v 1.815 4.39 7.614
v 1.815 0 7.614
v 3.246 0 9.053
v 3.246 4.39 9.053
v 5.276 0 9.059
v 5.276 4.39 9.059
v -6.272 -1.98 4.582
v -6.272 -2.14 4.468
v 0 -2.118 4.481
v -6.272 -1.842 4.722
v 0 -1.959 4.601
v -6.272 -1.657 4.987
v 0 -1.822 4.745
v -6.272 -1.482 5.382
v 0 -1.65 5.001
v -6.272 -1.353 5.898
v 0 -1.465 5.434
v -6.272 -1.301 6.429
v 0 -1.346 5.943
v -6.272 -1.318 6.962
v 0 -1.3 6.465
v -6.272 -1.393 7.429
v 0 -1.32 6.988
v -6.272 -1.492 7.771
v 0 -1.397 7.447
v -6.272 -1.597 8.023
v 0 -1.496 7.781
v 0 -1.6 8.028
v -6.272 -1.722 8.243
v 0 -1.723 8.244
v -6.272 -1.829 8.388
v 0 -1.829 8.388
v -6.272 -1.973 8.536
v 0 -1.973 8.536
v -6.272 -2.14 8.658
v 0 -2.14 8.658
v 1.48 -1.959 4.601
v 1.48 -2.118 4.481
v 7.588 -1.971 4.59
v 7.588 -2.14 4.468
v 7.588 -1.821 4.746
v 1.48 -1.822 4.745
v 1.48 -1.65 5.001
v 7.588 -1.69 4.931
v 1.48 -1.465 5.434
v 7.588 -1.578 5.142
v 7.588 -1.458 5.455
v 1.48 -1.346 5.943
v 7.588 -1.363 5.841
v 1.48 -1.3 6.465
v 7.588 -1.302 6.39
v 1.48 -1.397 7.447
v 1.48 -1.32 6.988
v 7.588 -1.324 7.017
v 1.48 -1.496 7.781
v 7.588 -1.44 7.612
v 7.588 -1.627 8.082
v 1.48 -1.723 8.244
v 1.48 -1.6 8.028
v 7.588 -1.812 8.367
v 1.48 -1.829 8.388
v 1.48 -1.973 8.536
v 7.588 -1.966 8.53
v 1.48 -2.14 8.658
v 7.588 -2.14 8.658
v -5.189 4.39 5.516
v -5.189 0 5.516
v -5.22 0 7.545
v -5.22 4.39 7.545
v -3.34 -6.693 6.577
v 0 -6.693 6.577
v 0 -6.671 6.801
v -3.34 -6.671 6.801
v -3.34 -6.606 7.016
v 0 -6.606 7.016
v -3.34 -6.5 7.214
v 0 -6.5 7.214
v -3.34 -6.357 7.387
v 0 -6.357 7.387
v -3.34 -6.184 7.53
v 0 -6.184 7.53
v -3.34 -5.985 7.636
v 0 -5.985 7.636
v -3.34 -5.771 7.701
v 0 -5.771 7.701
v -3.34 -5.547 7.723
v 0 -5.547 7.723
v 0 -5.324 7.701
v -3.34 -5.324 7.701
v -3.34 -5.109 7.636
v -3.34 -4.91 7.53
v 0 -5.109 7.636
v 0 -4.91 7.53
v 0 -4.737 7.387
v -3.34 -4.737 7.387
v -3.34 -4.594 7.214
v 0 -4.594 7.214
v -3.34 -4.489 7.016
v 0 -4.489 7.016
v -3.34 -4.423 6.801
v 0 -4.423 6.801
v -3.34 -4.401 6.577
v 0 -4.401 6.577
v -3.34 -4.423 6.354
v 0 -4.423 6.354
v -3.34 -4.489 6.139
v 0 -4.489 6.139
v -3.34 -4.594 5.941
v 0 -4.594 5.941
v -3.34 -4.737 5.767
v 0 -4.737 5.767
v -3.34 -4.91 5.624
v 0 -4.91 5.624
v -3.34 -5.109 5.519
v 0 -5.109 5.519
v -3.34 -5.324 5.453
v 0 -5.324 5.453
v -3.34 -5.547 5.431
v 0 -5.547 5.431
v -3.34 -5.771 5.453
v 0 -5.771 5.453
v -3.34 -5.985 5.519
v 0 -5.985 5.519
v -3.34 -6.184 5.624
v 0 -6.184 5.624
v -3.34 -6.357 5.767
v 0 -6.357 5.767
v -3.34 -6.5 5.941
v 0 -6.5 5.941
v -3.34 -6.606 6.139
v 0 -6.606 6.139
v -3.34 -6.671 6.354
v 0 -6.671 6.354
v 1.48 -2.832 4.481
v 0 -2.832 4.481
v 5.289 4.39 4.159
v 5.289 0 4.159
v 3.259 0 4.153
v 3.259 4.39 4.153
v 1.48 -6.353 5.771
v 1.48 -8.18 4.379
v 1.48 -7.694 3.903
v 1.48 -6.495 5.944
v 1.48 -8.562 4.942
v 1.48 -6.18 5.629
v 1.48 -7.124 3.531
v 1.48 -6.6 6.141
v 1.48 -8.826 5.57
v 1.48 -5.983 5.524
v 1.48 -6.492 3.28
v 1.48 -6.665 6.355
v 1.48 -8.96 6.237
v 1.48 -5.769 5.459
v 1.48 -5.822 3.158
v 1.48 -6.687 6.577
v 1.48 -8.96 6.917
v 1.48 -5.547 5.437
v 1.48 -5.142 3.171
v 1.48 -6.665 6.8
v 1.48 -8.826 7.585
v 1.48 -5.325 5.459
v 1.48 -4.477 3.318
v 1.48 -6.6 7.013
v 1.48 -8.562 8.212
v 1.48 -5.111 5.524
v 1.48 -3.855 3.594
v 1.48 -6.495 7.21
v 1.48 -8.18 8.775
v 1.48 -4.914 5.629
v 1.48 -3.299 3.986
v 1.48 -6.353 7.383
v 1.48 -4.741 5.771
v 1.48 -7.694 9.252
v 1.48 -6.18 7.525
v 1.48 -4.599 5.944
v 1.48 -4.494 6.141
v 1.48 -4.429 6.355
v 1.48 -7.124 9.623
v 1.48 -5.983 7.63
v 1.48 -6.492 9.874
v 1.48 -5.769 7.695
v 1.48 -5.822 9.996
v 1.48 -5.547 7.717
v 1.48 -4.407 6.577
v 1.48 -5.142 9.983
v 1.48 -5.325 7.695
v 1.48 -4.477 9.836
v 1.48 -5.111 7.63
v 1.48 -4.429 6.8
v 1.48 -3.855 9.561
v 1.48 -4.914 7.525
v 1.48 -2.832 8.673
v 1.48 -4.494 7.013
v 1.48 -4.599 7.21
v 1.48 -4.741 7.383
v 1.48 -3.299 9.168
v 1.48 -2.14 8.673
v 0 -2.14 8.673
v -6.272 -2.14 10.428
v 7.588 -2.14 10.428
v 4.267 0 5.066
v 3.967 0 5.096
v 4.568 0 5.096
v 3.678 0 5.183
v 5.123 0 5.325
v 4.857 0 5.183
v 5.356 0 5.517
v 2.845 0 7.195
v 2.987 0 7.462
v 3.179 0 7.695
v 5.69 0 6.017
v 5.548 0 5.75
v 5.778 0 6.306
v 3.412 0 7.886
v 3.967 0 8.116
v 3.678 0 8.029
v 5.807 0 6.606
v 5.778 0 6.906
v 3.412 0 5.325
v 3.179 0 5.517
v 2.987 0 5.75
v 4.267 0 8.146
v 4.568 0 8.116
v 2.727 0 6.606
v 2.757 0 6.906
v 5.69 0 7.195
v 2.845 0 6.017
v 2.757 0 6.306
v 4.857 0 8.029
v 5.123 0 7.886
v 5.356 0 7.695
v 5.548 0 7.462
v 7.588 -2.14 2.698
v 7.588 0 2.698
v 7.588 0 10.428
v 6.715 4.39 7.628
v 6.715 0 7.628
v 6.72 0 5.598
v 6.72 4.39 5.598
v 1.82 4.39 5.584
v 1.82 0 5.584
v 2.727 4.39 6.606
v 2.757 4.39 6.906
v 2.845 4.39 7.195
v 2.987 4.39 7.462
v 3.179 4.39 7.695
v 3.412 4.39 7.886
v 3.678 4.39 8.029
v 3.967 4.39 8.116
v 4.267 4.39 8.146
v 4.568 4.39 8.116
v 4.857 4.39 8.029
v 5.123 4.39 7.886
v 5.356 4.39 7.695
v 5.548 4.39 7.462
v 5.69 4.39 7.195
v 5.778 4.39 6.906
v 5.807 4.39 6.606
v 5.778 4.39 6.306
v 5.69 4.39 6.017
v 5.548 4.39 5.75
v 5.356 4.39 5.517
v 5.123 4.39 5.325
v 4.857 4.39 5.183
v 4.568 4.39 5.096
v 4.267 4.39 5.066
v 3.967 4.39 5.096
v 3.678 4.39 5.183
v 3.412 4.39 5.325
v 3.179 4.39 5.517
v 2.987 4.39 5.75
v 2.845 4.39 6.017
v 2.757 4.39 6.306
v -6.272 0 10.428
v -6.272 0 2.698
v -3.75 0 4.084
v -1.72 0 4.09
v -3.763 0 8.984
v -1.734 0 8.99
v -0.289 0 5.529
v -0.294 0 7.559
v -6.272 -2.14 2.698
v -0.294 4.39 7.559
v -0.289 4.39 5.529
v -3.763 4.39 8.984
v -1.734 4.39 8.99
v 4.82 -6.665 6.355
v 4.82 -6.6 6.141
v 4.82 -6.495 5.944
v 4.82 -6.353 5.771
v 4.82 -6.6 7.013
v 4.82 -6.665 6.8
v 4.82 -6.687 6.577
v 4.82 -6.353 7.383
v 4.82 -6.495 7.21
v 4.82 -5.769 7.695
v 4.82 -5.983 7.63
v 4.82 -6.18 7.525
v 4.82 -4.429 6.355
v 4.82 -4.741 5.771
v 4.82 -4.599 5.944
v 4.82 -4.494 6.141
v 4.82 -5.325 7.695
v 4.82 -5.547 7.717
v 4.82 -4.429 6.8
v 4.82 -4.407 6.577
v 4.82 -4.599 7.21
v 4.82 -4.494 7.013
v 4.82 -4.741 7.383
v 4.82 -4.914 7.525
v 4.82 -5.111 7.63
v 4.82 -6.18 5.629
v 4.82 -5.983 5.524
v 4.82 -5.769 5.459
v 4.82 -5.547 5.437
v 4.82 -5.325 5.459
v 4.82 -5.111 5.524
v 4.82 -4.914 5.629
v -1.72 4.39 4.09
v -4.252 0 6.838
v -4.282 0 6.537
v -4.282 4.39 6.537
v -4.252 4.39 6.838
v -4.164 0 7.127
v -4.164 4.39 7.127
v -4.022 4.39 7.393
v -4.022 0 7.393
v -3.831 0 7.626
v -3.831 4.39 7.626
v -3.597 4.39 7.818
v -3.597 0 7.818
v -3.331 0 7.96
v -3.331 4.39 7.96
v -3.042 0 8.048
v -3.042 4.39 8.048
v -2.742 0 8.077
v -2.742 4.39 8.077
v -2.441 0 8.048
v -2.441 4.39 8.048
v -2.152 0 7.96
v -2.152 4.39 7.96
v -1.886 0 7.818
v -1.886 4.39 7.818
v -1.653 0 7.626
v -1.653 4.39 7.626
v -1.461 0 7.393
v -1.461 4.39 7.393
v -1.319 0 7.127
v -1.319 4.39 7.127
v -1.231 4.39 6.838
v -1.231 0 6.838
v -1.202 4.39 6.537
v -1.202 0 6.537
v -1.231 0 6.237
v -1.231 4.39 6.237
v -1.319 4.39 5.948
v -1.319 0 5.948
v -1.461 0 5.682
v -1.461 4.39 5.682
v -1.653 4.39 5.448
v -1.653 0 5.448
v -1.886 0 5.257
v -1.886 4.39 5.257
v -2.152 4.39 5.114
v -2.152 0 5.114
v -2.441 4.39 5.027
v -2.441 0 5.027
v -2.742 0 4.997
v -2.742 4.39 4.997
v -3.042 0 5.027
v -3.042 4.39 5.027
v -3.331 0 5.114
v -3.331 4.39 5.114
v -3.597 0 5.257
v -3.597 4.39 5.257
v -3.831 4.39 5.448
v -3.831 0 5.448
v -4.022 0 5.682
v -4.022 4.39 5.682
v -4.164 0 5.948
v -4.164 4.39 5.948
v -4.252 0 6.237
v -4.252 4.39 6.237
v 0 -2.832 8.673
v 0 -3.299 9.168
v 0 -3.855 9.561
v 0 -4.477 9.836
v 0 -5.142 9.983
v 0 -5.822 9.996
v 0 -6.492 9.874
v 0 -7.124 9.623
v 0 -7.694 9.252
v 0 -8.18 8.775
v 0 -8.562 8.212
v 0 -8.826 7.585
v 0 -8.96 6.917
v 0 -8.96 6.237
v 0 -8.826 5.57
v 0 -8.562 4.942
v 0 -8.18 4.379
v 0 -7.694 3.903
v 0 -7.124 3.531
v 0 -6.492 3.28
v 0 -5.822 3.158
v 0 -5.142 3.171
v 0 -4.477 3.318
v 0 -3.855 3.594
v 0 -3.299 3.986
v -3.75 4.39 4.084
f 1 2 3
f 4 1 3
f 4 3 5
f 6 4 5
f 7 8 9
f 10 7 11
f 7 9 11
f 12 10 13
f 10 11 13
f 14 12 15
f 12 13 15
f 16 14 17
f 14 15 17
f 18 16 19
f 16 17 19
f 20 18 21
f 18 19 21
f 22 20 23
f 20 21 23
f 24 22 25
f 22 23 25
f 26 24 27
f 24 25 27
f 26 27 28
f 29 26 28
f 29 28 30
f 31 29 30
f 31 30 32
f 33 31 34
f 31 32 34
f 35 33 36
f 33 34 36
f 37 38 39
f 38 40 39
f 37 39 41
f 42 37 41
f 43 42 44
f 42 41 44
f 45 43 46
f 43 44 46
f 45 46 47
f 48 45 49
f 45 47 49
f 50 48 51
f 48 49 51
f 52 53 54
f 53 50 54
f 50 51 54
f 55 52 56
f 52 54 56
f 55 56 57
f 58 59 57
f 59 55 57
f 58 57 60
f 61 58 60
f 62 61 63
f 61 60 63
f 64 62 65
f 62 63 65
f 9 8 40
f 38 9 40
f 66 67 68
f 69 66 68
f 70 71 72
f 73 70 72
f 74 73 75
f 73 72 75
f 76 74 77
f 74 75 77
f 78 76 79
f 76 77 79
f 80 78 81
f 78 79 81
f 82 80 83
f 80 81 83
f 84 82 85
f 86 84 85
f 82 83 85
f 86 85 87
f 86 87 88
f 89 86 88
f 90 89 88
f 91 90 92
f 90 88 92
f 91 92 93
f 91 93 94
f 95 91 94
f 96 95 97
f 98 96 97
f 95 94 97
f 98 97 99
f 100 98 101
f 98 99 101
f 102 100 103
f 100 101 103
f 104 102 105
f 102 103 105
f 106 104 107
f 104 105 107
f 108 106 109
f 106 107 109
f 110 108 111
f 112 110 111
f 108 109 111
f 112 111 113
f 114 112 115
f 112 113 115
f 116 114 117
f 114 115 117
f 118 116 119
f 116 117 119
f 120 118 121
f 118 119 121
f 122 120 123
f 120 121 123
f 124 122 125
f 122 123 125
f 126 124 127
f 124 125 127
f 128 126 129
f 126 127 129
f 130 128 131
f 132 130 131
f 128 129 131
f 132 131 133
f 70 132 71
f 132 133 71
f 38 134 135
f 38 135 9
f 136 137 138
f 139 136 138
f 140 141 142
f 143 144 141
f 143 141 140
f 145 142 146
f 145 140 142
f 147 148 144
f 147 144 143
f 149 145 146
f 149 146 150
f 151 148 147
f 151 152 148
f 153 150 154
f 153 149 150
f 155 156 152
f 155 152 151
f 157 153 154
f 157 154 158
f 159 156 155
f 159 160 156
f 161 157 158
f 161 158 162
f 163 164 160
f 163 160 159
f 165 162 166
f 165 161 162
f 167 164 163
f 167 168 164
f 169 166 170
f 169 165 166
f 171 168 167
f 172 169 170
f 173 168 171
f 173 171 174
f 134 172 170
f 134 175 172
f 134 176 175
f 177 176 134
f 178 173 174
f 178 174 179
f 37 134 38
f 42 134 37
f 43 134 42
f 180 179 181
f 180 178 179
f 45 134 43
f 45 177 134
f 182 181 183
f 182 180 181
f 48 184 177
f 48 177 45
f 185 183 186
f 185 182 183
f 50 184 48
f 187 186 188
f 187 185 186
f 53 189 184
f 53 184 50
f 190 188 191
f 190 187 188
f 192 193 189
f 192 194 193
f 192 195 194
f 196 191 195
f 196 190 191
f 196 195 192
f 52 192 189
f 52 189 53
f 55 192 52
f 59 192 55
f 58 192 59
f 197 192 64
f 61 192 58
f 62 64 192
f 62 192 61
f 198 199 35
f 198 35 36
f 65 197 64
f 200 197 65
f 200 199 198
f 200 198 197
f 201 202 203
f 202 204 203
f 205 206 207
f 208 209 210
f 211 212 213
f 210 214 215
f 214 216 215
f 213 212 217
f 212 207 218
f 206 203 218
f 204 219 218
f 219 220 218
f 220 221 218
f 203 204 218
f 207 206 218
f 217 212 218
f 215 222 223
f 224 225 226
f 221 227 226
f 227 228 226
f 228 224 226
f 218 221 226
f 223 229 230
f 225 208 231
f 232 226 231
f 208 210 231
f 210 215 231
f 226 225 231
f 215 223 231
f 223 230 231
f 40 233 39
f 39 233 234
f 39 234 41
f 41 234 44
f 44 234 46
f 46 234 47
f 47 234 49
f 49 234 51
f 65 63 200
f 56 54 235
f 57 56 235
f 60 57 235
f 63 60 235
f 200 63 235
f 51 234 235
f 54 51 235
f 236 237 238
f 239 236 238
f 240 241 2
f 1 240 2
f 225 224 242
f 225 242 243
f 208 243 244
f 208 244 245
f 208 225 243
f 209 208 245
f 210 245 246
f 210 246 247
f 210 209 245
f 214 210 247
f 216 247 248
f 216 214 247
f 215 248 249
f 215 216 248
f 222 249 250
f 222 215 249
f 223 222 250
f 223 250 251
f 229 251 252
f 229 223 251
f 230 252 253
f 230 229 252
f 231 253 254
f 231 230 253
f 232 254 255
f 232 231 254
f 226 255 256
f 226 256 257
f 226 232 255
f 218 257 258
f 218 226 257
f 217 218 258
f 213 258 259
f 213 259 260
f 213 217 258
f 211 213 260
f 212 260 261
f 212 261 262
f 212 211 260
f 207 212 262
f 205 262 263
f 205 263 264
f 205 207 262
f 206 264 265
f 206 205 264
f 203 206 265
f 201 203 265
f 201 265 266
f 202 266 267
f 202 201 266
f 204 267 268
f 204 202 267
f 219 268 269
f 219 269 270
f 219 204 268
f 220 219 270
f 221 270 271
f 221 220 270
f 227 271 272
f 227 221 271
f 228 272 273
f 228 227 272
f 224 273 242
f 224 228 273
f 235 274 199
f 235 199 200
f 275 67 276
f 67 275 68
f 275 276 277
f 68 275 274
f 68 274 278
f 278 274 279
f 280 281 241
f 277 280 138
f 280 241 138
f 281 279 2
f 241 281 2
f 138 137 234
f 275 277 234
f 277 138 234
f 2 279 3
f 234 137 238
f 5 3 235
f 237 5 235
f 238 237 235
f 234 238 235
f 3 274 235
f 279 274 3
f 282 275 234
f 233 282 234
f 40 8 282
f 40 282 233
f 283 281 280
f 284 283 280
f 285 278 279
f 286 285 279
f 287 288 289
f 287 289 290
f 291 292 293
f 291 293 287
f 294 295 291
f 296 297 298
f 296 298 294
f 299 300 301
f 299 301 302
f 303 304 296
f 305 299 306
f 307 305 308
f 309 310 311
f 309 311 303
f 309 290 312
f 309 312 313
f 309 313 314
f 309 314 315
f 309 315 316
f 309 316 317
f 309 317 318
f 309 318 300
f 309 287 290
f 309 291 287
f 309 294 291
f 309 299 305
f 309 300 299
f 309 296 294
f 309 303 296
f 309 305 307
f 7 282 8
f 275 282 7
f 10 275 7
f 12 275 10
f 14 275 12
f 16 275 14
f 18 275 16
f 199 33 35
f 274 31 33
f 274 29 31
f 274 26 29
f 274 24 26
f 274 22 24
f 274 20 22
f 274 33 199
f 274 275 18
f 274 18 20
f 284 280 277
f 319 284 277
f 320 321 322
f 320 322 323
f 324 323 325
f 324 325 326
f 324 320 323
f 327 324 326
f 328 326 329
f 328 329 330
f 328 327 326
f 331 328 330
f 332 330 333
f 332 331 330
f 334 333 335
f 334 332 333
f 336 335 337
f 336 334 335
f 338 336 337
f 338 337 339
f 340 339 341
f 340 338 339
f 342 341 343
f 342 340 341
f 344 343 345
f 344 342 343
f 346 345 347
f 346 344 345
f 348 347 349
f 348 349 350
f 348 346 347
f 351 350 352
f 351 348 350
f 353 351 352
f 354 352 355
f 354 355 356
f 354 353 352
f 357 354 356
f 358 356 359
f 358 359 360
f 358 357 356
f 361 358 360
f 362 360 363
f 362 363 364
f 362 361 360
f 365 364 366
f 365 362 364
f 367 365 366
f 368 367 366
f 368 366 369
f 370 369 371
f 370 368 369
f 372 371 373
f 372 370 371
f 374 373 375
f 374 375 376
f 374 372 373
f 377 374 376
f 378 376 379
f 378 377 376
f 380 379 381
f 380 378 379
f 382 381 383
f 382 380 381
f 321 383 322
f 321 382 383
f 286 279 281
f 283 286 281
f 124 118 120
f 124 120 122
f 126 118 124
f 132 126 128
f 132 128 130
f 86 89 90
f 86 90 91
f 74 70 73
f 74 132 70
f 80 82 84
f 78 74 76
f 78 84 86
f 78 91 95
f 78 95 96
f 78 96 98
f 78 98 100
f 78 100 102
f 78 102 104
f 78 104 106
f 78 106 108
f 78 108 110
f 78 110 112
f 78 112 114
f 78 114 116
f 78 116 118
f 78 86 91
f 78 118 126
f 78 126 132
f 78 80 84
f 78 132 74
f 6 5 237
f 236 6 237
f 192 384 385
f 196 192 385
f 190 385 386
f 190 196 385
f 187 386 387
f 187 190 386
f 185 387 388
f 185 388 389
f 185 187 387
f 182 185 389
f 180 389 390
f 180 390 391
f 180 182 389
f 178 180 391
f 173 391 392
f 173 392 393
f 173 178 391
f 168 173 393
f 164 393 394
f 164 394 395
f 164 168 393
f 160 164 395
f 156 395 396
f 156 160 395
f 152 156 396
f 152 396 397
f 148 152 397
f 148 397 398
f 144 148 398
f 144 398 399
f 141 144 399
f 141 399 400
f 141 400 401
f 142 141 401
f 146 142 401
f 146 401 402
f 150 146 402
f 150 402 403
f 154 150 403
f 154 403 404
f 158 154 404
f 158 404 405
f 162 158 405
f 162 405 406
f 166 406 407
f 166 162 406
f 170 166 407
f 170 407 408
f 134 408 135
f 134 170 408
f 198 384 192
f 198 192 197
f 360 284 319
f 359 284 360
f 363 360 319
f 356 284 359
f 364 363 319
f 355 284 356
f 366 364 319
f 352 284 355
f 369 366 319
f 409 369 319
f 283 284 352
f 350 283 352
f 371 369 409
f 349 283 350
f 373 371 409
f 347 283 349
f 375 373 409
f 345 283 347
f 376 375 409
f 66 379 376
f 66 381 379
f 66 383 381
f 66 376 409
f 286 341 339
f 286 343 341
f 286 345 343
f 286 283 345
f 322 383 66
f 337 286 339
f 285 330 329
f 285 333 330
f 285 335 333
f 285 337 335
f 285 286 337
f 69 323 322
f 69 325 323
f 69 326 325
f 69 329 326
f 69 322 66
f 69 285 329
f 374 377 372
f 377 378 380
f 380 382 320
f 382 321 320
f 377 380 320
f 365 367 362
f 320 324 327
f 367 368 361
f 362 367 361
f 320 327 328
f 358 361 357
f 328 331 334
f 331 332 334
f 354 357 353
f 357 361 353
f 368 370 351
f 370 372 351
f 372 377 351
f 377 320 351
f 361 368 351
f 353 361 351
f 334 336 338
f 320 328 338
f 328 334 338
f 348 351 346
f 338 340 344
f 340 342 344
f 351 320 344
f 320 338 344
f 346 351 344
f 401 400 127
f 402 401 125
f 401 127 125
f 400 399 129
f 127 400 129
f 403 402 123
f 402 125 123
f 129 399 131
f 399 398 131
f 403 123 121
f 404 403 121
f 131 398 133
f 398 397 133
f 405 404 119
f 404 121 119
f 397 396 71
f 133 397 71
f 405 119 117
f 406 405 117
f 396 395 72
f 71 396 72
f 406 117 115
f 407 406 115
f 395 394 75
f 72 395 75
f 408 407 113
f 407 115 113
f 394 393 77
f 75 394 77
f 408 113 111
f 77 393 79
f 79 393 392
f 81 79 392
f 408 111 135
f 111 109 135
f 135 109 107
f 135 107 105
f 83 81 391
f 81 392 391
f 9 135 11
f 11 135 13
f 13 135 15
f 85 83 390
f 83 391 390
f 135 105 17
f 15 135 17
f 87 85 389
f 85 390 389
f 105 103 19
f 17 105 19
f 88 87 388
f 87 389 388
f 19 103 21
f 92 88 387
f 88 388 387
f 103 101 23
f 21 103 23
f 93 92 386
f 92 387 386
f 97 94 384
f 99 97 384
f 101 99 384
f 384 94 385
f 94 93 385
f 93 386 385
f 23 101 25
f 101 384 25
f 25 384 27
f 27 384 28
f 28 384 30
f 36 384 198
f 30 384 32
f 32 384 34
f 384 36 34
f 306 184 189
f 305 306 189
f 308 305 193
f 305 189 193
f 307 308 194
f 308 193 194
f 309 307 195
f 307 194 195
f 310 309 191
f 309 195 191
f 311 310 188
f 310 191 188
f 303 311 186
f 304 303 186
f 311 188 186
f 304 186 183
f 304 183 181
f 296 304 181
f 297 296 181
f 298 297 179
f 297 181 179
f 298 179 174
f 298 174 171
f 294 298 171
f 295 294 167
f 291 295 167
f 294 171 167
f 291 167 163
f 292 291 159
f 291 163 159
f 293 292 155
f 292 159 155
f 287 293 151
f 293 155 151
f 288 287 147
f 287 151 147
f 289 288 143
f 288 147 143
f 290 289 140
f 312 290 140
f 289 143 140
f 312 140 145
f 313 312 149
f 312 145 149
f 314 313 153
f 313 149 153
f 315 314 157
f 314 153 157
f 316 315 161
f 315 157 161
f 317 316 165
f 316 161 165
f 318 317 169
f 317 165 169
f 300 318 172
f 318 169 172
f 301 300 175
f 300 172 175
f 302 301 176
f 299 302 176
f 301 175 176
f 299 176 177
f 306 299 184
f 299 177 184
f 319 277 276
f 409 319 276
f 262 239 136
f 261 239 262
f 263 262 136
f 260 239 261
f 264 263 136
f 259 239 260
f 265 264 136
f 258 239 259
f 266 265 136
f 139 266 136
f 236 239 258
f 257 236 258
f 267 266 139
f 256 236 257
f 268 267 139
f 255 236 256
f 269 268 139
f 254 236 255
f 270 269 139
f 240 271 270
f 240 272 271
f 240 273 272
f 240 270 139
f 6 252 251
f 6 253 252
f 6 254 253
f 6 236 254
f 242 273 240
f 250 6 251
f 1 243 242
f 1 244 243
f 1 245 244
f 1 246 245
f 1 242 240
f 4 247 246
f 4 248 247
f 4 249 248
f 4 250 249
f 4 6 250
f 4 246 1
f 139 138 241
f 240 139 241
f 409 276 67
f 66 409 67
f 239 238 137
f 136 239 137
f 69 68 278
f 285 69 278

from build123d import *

# Parameters (mm, degrees)
F0_W      = 13.86
F0_H      = 7.73
F1_DEPTH  = 2.14
F3_DEPTH  = 13.861
F4_W      = 1.7220231239
F4_H      = 4.1921688244
F5_DEPTH  = 1.48
F6_R      = 3.43
F7_DEPTH  = 1.48
F8_R      = 1.14
F10_DEPTH = 3.34
F9_R      = 1.1457110781
F11_DEPTH = 3.34
F12_R     = 1.54
F13_DEPTH = 4.39


with BuildPart() as f1:
    # F0 (on Front) → F1 (new body)
    with BuildSketch(Plane.XZ):
        with Locations((0.6576154042, 6.5625002608)):
            Rectangle(F0_W, F0_H)
    extrude(amount=F1_DEPTH)

    # F2 (on face) → F3 (cut, through all)
    with BuildSketch(Plane.YZ.offset(7.5876154042)):
        with BuildLine():
            add(Edge.make_bspline(
                [(-2.14, 4.4675002608), (-1.0178836739, 5.1285764004), (-1.0178836739, 10.7190171735), (-7.3584975292, 6.5625002608), (-3.2052818458, 3.8399072084), (-2.14, 4.4675002608)],
                knots=[0, 0, 0, 0, 0.3449820825, 0.6724910412, 1, 1, 1, 1], degree=3))
        make_face()
    extrude(amount=-F3_DEPTH, mode=Mode.SUBTRACT)

    # F4 (on Right) → F5 (join)
    with BuildSketch(Plane.YZ):
        with Locations((-2.9032976599, 6.5771206282)):
            Rectangle(F4_W, F4_H)
        Polygon((-2.042286098, 8.6732050404), (-2.042286098, 4.481036216), (-1.0486273095, 4.481036216), (-1.0486273095, 8.7523022667), align=None)
    extrude(amount=F5_DEPTH)

    # F6 (on face) → F7 (join)
    with BuildSketch(Plane.YZ.offset(1.48)):
        with Locations((-5.5470176696, 6.5771206282)):
            Circle(F6_R)
    extrude(amount=-F7_DEPTH)

    # F8 (on face) → F10 (join)
    with BuildSketch(Plane.YZ.offset(1.48)):
        with Locations((-5.5470176696, 6.5771206282)):
            Circle(F8_R)
    extrude(amount=F10_DEPTH)

    # F9 (on face) → F11 (join)
    with BuildSketch(Plane(origin=(0, 0, 0), x_dir=(0, -1, 0), z_dir=(-1, 0, 0))):
        with Locations((5.5470176696, 6.5771206282)):
            Circle(F9_R)
    extrude(amount=F11_DEPTH)

    # F12 (on face) → F13 (join)
    with BuildSketch(Plane(origin=(0, 0, 0), x_dir=(-1, 0, 0), z_dir=(0, 1, 0))):
        Polygon((-1.8146777797, 7.6139823431), (-3.245869735, 9.0531328988), (-5.2755083889, 9.0587604791), (-6.7146589446, 7.6275685238), (-6.7202865249, 5.59792987), (-5.2890945696, 4.1587793143), (-3.2594559158, 4.1531517339), (-1.8203053601, 5.5843436892), align=None)
        with Locations((-4.2674821523, 6.6059561065)):
            Circle(F12_R, mode=Mode.SUBTRACT)
        Polygon((1.7335861807, 8.9899811648), (0.294435625, 7.5587892095), (0.2888080447, 5.5291505557), (1.72, 4.09), (3.7496386538, 4.0843724197), (5.1887892095, 5.515564375), (5.2196069168, 7.5449768525), (3.7632248346, 8.9843535845), align=None)
        with Locations((2.7416124173, 6.5371767923)):
            Circle(F12_R, mode=Mode.SUBTRACT)
    extrude(amount=F13_DEPTH)


solid = f1.part
